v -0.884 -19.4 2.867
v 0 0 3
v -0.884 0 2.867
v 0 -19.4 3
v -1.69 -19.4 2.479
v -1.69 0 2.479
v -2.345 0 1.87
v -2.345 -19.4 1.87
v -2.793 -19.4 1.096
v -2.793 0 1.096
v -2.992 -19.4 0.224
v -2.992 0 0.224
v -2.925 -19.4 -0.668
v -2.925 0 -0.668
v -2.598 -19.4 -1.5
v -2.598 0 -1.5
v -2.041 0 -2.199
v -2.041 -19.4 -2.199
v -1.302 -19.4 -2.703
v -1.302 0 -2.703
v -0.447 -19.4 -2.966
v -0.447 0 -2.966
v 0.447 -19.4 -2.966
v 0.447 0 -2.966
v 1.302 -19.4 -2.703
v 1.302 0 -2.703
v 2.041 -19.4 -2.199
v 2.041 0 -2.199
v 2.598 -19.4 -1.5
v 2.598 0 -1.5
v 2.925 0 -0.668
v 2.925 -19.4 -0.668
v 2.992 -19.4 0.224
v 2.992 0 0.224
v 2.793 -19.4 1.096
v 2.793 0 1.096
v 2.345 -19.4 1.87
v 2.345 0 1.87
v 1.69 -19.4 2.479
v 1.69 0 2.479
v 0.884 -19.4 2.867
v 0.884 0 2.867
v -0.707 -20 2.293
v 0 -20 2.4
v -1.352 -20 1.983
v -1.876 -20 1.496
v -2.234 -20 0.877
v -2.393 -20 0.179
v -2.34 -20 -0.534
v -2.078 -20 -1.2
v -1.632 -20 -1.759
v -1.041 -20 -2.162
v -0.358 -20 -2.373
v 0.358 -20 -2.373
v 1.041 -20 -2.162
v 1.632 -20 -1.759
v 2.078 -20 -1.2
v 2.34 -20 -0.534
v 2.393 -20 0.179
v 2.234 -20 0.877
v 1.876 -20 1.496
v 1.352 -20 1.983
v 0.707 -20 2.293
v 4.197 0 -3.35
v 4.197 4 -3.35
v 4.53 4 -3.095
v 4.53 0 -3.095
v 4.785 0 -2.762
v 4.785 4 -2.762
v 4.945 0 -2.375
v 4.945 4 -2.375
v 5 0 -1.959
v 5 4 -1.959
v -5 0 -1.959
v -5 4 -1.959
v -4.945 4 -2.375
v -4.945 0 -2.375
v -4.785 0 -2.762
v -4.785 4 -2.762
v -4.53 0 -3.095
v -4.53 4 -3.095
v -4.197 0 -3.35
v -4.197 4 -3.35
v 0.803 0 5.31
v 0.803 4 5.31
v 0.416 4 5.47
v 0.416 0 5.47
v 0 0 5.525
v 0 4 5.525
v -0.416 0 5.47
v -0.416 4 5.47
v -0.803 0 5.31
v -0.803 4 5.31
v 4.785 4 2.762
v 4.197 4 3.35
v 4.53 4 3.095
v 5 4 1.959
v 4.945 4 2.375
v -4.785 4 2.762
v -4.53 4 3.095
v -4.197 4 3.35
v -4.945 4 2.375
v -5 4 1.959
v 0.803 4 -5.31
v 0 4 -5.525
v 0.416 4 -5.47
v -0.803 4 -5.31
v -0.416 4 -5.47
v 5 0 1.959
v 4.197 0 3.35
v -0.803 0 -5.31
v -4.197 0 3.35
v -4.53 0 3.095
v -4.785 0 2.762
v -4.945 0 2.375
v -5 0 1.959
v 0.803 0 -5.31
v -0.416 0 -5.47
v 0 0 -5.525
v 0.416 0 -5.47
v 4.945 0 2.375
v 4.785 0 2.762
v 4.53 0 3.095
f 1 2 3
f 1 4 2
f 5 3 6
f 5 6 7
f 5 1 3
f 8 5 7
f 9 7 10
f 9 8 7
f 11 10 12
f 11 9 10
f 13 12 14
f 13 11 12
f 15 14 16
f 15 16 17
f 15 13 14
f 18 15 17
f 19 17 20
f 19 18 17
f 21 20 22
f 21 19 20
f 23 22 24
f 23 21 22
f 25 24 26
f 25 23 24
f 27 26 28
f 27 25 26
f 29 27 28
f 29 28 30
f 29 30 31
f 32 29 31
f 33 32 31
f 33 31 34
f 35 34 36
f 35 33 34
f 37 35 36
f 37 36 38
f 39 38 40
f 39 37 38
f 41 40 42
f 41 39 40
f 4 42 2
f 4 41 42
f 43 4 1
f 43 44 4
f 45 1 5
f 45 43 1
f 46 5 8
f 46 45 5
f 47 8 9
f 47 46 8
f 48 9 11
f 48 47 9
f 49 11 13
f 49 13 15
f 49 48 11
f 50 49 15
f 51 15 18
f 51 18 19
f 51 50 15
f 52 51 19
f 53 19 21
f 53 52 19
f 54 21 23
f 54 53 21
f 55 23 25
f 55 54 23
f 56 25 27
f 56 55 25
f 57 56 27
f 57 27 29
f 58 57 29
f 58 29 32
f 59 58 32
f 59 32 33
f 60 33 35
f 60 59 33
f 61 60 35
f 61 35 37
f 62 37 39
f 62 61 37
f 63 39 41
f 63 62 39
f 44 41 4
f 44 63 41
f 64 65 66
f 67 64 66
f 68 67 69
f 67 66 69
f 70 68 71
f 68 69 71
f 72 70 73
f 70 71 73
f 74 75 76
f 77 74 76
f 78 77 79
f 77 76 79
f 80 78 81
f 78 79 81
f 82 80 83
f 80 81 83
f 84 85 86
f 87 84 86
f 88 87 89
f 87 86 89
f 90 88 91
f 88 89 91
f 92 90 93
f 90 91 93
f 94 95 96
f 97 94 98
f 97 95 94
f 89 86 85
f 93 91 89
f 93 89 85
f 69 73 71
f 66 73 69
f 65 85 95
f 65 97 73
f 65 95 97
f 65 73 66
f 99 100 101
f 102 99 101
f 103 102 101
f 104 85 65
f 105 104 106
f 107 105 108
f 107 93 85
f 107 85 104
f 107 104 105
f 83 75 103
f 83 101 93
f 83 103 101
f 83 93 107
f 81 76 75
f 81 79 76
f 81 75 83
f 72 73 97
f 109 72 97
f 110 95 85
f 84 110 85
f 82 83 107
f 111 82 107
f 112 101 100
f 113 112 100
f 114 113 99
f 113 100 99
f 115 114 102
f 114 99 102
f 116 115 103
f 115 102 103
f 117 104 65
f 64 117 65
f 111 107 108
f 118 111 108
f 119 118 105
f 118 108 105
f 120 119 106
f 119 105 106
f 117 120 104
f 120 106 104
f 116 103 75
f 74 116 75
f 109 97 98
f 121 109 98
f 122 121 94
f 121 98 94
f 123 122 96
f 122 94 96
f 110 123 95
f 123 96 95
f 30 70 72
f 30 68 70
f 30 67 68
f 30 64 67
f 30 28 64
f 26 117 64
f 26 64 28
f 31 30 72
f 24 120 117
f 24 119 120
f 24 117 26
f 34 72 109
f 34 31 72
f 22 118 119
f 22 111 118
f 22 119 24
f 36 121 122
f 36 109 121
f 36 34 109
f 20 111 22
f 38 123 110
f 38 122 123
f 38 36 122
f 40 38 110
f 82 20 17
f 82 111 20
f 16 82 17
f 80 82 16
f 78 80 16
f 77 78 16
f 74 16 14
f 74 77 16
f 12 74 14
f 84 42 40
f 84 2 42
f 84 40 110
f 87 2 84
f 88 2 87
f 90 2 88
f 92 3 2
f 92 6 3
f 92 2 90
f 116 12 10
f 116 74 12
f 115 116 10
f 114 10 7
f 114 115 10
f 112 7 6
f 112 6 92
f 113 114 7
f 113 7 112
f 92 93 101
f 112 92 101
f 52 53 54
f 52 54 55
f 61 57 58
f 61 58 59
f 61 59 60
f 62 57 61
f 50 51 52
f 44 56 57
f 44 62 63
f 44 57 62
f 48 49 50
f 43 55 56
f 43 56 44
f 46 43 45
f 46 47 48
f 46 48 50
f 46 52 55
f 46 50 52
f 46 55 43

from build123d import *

# Parameters (mm, degrees)
F2_R     = 8.2875
F3_DEPTH = 25


# Not quite as in the source:
# - a feature names something its author has since deleted; it is built from what else it names


with BuildPart() as f1:
    # F0 (on Right) → F1 (revolve)
    with BuildSketch(Plane.YZ):
        Polygon((0, 8.2875), (0, 3), (-19.4, 3), (-20, 2.4), (-20, 0), (4, 0), (4, 8.2875), align=None)
    revolve(axis=Axis((0, -8, 0), (0, -1, 0)))

    # F2 (on face) → F3 (cut)
    with BuildSketch(Plane(origin=(0, 4, 0), x_dir=(-1, 0, 0), z_dir=(0, 1, 0))):
        Circle(F2_R)
        with BuildLine():
            ThreePointArc((0.803173326, -5.3097903559), (0, -5.525), (-0.803173326, -5.3097903559))
            Line((-0.803173326, -5.3097903559), (-4.196826674, -3.3504636819))
            ThreePointArc((-4.196826674, -3.3504636819), (-4.7847903559, -2.7625), (-5, -1.959326674))
            Line((-5, -1.959326674), (-5, 1.959326674))
            ThreePointArc((-5, 1.959326674), (-4.7847903559, 2.7625), (-4.196826674, 3.3504636819))
            Line((-4.196826674, 3.3504636819), (-0.803173326, 5.3097903559))
            ThreePointArc((-0.803173326, 5.3097903559), (0, 5.525), (0.803173326, 5.3097903559))
            Line((0.803173326, 5.3097903559), (4.196826674, 3.3504636819))
            ThreePointArc((4.196826674, 3.3504636819), (4.7847903559, 2.7625), (5, 1.959326674))
            Line((5, 1.959326674), (5, -1.959326674))
            ThreePointArc((5, -1.959326674), (4.7847903559, -2.7625), (4.196826674, -3.3504636819))
            Line((4.196826674, -3.3504636819), (0.803173326, -5.3097903559))
        make_face(mode=Mode.SUBTRACT)
    extrude(amount=-F3_DEPTH, mode=Mode.SUBTRACT)


solid = f1.part
